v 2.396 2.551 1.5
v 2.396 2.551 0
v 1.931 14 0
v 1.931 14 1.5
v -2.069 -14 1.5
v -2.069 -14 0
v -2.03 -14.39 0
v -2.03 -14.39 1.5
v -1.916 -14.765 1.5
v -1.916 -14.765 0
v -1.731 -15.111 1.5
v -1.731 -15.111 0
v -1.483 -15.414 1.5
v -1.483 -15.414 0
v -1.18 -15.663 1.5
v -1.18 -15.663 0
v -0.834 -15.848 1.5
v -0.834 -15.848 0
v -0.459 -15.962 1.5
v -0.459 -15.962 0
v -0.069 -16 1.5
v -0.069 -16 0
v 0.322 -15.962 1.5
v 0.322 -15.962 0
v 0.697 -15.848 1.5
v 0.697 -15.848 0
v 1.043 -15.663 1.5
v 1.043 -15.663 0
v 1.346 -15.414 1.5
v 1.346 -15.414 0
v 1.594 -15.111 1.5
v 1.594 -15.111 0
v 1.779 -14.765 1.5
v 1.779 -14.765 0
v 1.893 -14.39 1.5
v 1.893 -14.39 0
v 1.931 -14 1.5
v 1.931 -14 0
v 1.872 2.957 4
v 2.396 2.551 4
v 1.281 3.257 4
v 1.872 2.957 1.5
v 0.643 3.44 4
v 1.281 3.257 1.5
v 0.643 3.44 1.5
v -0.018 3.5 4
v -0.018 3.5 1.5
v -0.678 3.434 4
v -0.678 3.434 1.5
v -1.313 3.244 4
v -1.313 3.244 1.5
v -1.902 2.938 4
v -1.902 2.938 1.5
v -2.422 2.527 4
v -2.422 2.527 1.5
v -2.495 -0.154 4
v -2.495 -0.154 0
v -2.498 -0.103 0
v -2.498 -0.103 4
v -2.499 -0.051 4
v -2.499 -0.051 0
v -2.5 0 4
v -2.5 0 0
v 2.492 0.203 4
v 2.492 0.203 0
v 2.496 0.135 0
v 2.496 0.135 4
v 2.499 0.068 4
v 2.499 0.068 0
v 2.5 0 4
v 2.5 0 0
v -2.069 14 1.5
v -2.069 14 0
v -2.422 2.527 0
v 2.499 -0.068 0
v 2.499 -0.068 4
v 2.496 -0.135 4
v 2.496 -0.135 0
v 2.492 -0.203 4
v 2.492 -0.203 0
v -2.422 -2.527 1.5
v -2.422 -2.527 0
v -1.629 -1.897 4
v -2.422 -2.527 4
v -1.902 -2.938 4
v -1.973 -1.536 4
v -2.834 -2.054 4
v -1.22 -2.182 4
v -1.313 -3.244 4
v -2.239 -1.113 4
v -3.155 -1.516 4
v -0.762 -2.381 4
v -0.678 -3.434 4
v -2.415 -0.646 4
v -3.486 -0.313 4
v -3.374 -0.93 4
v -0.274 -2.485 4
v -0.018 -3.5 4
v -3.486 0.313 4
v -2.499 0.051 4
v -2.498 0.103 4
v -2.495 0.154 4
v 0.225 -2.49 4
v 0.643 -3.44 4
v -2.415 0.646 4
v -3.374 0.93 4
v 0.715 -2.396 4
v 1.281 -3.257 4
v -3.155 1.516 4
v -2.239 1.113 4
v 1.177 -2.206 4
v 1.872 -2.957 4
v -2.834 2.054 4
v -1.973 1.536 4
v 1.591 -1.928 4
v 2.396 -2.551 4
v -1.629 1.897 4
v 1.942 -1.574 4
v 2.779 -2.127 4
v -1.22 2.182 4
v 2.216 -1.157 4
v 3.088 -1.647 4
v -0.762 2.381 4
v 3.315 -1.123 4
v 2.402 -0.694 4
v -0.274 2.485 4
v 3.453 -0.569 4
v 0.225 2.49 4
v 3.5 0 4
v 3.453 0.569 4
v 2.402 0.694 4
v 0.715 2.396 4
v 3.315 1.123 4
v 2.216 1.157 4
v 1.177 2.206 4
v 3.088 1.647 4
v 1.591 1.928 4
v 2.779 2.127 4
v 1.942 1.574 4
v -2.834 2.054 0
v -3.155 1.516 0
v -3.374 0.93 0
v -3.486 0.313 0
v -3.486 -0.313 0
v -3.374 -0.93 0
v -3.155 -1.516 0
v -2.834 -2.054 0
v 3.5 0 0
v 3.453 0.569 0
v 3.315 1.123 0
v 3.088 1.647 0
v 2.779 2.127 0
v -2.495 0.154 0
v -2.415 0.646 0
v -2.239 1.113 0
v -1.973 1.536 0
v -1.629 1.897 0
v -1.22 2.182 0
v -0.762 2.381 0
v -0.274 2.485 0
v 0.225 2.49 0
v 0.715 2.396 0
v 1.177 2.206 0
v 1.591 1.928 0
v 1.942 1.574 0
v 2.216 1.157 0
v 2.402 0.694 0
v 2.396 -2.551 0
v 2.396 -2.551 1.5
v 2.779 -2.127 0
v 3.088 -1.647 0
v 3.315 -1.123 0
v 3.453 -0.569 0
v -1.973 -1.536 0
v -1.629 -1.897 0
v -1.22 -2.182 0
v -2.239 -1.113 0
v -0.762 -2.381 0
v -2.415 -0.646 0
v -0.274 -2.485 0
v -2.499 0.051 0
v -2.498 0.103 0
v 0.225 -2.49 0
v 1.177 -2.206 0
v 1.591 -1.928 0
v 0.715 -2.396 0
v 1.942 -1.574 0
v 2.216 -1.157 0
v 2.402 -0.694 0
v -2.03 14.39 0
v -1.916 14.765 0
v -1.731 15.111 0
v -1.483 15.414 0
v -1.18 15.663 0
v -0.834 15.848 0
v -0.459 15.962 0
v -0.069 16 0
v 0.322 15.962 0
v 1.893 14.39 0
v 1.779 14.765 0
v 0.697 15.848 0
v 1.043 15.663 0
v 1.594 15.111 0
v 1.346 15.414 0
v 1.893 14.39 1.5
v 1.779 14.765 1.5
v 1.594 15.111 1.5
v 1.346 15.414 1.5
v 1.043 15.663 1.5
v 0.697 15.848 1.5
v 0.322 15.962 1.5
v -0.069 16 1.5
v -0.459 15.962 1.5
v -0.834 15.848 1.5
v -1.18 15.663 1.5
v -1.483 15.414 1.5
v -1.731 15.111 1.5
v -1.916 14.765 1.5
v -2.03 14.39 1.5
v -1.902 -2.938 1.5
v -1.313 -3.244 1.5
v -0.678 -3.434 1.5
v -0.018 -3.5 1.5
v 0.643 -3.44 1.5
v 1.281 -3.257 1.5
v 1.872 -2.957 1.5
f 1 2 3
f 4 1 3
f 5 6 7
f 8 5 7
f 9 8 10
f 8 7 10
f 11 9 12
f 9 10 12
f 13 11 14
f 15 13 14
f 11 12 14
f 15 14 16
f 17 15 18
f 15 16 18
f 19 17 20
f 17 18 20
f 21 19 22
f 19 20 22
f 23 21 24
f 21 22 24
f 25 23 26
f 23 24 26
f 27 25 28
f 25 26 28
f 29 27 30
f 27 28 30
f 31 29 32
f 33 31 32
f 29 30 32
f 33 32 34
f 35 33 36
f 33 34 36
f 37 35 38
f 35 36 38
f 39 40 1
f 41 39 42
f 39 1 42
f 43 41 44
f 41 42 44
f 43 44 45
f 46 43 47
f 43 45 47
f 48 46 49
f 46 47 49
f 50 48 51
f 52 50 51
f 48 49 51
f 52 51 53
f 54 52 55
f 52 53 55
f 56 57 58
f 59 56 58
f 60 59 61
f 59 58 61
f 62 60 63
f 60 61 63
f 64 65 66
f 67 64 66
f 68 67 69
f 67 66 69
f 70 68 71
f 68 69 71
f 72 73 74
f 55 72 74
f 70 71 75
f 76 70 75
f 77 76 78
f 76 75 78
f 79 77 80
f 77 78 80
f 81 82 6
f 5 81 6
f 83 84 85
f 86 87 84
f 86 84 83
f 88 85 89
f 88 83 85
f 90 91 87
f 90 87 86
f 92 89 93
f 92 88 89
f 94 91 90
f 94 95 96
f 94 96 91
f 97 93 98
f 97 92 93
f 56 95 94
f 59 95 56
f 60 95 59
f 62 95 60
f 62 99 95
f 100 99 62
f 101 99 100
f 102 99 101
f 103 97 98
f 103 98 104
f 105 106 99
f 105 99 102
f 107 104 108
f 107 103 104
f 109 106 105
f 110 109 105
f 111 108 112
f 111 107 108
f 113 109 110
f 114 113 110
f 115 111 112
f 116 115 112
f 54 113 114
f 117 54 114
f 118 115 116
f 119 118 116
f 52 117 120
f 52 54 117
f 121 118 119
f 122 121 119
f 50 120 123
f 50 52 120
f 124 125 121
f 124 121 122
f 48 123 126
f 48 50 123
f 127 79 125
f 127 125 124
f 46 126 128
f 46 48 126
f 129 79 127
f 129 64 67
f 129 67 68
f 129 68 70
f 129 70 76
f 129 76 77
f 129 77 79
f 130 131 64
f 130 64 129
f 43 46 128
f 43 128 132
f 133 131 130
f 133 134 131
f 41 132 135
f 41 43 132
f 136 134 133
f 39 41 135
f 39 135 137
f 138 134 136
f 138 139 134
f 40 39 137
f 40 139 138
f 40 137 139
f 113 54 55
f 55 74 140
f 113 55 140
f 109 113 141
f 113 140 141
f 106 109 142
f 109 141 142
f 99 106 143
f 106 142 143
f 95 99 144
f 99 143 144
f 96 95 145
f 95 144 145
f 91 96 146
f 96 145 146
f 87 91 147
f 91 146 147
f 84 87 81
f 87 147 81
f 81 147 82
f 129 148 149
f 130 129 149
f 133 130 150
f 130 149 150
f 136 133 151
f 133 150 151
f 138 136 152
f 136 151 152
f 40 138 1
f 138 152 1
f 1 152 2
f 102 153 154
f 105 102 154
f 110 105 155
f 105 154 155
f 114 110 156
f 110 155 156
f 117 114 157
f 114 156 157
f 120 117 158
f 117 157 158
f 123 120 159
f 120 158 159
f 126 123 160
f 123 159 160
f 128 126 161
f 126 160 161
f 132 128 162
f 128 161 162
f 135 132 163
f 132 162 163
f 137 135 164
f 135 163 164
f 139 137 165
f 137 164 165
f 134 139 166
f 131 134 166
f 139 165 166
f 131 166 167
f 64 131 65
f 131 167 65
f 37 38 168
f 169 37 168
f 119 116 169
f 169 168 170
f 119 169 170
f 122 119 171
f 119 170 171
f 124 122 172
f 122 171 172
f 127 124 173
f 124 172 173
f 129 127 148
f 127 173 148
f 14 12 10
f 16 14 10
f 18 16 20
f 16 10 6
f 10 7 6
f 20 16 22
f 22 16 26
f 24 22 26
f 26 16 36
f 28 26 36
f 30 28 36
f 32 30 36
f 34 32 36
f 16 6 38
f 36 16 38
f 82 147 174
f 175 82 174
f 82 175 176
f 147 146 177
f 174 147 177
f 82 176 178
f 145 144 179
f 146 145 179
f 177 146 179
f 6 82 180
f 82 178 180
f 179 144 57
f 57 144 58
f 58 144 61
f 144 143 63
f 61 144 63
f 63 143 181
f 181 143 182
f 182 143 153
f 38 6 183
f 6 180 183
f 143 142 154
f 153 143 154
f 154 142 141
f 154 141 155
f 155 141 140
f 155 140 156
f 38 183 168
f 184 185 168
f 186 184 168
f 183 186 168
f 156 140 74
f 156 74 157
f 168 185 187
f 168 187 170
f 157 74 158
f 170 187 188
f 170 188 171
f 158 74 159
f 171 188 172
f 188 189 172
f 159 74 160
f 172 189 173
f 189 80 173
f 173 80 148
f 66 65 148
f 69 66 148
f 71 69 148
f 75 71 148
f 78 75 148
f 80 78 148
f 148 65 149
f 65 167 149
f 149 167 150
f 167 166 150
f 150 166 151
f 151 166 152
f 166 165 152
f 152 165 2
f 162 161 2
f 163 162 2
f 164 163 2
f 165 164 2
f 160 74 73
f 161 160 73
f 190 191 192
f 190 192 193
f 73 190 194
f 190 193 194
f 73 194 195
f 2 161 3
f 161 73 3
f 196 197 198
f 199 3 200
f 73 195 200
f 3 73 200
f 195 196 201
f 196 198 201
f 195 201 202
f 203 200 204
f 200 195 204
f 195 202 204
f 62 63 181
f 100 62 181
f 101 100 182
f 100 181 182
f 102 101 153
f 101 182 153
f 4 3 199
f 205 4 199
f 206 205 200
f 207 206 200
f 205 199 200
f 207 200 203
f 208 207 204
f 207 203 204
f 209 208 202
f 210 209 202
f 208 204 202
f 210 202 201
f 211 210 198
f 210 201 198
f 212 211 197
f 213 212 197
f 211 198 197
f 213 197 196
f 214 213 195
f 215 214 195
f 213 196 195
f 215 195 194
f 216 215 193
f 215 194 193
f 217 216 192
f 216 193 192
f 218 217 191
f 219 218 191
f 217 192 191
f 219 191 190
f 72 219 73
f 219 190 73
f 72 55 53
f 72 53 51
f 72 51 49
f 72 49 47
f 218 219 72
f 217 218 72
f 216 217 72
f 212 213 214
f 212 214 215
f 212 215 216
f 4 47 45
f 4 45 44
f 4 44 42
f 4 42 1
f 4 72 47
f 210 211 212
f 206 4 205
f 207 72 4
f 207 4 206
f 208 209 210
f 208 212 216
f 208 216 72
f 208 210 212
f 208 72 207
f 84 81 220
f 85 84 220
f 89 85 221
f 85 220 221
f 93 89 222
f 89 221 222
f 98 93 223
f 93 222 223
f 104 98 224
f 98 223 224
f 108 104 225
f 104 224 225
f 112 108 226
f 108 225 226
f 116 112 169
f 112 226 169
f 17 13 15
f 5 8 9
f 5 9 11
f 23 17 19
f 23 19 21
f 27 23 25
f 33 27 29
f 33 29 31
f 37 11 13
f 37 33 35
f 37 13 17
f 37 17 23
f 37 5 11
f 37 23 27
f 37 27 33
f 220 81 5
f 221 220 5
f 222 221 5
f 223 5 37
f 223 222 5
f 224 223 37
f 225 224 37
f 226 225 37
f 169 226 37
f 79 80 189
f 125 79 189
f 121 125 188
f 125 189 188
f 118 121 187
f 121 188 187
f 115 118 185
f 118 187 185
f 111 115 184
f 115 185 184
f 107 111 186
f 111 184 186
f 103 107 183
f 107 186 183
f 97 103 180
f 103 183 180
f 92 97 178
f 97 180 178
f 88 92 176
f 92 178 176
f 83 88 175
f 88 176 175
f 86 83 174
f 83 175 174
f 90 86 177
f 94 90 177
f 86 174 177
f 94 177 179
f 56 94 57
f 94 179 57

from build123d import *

# Parameters (mm, degrees)
ESQUISSE1_R        = 3.5
ESQUISSE1_R_2      = 2.5
BOSS_EXTRU_1_DEPTH = 4
BOSS_EXTRU_2_DEPTH = 1.5


with BuildPart() as part:
    # Esquisse1 → Boss.-Extru.1 (new body)
    with BuildSketch(Plane.XY):
        Circle(ESQUISSE1_R)
        Circle(ESQUISSE1_R_2, mode=Mode.SUBTRACT)
    extrude(amount=BOSS_EXTRU_1_DEPTH)

    # Esquisse1<3> → Boss.-Extru.2 (add)
    with BuildSketch(Plane.XY):
        with BuildLine():
            Line((-2.068537469, 14), (-2.42213609, 2.526510788))
            ThreePointArc((-2.42213609, 2.526510788), (-0.017735252, 3.499955066), (2.396407287, 2.550927696))
            Line((2.396407287, 2.550927696), (1.931462531, 14))
            ThreePointArc((1.931462531, 14), (-0.068537469, 16), (-2.068537469, 14))
        make_face()
        with BuildLine():
            ThreePointArc((2.396407287, -2.550927696), (-0.017735252, -3.499955066), (-2.42213609, -2.526510788))
            Line((-2.42213609, -2.526510788), (-2.068537469, -14))
            ThreePointArc((-2.068537469, -14), (-0.068537469, -16), (1.931462531, -14))
            Line((1.931462531, -14), (2.396407287, -2.550927696))
        make_face()
    extrude(amount=BOSS_EXTRU_2_DEPTH)


solid = part.part
